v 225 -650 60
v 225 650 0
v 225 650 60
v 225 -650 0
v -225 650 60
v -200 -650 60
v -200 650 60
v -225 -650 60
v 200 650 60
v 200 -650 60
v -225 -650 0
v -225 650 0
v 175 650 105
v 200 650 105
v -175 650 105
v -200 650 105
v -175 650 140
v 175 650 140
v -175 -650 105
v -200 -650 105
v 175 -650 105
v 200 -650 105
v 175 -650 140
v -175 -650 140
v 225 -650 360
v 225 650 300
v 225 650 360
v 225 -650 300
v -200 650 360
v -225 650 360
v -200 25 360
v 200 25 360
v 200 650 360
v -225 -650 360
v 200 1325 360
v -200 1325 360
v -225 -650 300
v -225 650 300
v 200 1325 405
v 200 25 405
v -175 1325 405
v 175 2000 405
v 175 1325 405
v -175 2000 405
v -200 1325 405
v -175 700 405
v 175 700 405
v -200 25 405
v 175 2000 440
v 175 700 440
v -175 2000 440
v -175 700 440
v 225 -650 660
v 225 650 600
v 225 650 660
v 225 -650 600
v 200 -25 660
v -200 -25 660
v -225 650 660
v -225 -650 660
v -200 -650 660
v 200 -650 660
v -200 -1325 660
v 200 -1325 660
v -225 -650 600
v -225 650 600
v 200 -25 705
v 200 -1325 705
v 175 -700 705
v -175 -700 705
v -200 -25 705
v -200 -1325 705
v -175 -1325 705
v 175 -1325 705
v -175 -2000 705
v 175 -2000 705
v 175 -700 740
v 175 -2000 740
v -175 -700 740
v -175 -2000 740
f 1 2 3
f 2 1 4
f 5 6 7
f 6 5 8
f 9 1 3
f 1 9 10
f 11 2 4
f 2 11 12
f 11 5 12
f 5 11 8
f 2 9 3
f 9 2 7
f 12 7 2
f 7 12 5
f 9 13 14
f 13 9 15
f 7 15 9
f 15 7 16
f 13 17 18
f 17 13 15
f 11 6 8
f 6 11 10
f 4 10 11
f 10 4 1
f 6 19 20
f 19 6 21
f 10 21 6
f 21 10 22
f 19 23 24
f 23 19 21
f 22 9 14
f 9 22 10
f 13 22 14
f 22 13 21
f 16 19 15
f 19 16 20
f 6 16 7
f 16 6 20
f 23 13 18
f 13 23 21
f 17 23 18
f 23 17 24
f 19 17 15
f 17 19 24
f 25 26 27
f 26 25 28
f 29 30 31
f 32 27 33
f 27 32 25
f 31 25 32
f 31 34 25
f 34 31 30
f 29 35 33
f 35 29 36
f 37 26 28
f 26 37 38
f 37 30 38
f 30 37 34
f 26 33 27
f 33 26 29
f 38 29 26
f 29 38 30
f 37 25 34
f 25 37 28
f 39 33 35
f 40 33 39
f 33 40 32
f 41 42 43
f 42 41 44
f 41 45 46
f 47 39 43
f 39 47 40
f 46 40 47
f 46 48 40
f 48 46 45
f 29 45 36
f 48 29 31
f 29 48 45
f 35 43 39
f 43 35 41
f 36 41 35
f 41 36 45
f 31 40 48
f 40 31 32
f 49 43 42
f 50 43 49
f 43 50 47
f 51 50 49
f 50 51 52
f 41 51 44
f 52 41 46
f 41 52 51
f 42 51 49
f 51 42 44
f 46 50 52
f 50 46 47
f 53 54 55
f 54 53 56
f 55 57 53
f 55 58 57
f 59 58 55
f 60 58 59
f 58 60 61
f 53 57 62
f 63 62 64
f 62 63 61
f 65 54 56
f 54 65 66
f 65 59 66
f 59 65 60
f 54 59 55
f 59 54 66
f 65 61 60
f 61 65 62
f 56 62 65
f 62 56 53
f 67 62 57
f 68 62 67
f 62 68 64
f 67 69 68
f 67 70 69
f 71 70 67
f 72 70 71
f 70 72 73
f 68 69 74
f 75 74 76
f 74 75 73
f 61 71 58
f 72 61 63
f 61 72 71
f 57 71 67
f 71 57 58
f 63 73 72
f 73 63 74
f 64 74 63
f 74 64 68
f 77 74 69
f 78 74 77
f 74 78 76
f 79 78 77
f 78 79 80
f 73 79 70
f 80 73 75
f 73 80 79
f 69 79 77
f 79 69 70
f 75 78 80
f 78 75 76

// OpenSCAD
// Telescopic fork, 3 stages - generated by asrs_3d.py from out/design_result.json (F3) - units mm
// DESIGN - to be checked and released by the responsible engineer. Coordinates: x along aisle, y across, z up.

bays = 19;
levels = 10;
bay = 1925;
L_rack = 36675;
H_rack = 12600;
W_rack = 4100;
clear_beam = 1825;
z1 = 450;
pitch = 1250;
up_w = 100;
up_d = 80;
gap = 75;
aisle = 1500;
x0 = 1200;
y_face = 750;
y_rear = 2050;
y_crate_c = 1400;
cL = 1200;
cW = 800;
cH = 600;
c_leg = 160;
beam_h = 120;
beam_b = 50;
mast_h = 600;
mast_b = 400;
mast_t = 6;
H_mast = 13100;
wheel_D = 400;
wheelbase = 2400;
stroke = 1350;
drum_D = 315;
conv_top = 700;
fork_len = 1300;
rail_top_z0 = 13130;
rail_top_z1 = 13250;
tie_z0 = 13250;
tie_z1 = 13350;
fork_w = [450, 400, 350];  fork_t = [60, 45, 35];
function lz(l) = z1 + (l - 1) * pitch;     // beam top of level l
function cx(b, k) = x0 + b * bay + up_w + gap + cW / 2 + k * (cW + gap);
module box(a, b) { translate(a) cube([b[0]-a[0], b[1]-a[1], b[2]-a[2]]); }
module brace(a, b, w=40) { hull() { translate(a - [w/2, w/2, w/2]) cube(w); translate(b - [w/2, w/2, w/2]) cube(w); } }

// ext = stroke of the top stage (0 .. stroke), side = +1 right / -1 left
module fork(ext = 0, side = 1, z0 = 0) {
  sh = [0, ext / 2, ext];
  for (k = [0 : 2]) translate([-fork_w[k]/2, -fork_len/2 + side * sh[k], z0 + (k == 0 ? 0 : (k == 1 ? fork_t[0] : fork_t[0] + fork_t[1]))])
    cube([fork_w[k], fork_len, fork_t[k]]);
}
fork(0); translate([0, 0, 300]) fork(stroke, 1); translate([0, 0, 600]) fork(stroke, -1);
